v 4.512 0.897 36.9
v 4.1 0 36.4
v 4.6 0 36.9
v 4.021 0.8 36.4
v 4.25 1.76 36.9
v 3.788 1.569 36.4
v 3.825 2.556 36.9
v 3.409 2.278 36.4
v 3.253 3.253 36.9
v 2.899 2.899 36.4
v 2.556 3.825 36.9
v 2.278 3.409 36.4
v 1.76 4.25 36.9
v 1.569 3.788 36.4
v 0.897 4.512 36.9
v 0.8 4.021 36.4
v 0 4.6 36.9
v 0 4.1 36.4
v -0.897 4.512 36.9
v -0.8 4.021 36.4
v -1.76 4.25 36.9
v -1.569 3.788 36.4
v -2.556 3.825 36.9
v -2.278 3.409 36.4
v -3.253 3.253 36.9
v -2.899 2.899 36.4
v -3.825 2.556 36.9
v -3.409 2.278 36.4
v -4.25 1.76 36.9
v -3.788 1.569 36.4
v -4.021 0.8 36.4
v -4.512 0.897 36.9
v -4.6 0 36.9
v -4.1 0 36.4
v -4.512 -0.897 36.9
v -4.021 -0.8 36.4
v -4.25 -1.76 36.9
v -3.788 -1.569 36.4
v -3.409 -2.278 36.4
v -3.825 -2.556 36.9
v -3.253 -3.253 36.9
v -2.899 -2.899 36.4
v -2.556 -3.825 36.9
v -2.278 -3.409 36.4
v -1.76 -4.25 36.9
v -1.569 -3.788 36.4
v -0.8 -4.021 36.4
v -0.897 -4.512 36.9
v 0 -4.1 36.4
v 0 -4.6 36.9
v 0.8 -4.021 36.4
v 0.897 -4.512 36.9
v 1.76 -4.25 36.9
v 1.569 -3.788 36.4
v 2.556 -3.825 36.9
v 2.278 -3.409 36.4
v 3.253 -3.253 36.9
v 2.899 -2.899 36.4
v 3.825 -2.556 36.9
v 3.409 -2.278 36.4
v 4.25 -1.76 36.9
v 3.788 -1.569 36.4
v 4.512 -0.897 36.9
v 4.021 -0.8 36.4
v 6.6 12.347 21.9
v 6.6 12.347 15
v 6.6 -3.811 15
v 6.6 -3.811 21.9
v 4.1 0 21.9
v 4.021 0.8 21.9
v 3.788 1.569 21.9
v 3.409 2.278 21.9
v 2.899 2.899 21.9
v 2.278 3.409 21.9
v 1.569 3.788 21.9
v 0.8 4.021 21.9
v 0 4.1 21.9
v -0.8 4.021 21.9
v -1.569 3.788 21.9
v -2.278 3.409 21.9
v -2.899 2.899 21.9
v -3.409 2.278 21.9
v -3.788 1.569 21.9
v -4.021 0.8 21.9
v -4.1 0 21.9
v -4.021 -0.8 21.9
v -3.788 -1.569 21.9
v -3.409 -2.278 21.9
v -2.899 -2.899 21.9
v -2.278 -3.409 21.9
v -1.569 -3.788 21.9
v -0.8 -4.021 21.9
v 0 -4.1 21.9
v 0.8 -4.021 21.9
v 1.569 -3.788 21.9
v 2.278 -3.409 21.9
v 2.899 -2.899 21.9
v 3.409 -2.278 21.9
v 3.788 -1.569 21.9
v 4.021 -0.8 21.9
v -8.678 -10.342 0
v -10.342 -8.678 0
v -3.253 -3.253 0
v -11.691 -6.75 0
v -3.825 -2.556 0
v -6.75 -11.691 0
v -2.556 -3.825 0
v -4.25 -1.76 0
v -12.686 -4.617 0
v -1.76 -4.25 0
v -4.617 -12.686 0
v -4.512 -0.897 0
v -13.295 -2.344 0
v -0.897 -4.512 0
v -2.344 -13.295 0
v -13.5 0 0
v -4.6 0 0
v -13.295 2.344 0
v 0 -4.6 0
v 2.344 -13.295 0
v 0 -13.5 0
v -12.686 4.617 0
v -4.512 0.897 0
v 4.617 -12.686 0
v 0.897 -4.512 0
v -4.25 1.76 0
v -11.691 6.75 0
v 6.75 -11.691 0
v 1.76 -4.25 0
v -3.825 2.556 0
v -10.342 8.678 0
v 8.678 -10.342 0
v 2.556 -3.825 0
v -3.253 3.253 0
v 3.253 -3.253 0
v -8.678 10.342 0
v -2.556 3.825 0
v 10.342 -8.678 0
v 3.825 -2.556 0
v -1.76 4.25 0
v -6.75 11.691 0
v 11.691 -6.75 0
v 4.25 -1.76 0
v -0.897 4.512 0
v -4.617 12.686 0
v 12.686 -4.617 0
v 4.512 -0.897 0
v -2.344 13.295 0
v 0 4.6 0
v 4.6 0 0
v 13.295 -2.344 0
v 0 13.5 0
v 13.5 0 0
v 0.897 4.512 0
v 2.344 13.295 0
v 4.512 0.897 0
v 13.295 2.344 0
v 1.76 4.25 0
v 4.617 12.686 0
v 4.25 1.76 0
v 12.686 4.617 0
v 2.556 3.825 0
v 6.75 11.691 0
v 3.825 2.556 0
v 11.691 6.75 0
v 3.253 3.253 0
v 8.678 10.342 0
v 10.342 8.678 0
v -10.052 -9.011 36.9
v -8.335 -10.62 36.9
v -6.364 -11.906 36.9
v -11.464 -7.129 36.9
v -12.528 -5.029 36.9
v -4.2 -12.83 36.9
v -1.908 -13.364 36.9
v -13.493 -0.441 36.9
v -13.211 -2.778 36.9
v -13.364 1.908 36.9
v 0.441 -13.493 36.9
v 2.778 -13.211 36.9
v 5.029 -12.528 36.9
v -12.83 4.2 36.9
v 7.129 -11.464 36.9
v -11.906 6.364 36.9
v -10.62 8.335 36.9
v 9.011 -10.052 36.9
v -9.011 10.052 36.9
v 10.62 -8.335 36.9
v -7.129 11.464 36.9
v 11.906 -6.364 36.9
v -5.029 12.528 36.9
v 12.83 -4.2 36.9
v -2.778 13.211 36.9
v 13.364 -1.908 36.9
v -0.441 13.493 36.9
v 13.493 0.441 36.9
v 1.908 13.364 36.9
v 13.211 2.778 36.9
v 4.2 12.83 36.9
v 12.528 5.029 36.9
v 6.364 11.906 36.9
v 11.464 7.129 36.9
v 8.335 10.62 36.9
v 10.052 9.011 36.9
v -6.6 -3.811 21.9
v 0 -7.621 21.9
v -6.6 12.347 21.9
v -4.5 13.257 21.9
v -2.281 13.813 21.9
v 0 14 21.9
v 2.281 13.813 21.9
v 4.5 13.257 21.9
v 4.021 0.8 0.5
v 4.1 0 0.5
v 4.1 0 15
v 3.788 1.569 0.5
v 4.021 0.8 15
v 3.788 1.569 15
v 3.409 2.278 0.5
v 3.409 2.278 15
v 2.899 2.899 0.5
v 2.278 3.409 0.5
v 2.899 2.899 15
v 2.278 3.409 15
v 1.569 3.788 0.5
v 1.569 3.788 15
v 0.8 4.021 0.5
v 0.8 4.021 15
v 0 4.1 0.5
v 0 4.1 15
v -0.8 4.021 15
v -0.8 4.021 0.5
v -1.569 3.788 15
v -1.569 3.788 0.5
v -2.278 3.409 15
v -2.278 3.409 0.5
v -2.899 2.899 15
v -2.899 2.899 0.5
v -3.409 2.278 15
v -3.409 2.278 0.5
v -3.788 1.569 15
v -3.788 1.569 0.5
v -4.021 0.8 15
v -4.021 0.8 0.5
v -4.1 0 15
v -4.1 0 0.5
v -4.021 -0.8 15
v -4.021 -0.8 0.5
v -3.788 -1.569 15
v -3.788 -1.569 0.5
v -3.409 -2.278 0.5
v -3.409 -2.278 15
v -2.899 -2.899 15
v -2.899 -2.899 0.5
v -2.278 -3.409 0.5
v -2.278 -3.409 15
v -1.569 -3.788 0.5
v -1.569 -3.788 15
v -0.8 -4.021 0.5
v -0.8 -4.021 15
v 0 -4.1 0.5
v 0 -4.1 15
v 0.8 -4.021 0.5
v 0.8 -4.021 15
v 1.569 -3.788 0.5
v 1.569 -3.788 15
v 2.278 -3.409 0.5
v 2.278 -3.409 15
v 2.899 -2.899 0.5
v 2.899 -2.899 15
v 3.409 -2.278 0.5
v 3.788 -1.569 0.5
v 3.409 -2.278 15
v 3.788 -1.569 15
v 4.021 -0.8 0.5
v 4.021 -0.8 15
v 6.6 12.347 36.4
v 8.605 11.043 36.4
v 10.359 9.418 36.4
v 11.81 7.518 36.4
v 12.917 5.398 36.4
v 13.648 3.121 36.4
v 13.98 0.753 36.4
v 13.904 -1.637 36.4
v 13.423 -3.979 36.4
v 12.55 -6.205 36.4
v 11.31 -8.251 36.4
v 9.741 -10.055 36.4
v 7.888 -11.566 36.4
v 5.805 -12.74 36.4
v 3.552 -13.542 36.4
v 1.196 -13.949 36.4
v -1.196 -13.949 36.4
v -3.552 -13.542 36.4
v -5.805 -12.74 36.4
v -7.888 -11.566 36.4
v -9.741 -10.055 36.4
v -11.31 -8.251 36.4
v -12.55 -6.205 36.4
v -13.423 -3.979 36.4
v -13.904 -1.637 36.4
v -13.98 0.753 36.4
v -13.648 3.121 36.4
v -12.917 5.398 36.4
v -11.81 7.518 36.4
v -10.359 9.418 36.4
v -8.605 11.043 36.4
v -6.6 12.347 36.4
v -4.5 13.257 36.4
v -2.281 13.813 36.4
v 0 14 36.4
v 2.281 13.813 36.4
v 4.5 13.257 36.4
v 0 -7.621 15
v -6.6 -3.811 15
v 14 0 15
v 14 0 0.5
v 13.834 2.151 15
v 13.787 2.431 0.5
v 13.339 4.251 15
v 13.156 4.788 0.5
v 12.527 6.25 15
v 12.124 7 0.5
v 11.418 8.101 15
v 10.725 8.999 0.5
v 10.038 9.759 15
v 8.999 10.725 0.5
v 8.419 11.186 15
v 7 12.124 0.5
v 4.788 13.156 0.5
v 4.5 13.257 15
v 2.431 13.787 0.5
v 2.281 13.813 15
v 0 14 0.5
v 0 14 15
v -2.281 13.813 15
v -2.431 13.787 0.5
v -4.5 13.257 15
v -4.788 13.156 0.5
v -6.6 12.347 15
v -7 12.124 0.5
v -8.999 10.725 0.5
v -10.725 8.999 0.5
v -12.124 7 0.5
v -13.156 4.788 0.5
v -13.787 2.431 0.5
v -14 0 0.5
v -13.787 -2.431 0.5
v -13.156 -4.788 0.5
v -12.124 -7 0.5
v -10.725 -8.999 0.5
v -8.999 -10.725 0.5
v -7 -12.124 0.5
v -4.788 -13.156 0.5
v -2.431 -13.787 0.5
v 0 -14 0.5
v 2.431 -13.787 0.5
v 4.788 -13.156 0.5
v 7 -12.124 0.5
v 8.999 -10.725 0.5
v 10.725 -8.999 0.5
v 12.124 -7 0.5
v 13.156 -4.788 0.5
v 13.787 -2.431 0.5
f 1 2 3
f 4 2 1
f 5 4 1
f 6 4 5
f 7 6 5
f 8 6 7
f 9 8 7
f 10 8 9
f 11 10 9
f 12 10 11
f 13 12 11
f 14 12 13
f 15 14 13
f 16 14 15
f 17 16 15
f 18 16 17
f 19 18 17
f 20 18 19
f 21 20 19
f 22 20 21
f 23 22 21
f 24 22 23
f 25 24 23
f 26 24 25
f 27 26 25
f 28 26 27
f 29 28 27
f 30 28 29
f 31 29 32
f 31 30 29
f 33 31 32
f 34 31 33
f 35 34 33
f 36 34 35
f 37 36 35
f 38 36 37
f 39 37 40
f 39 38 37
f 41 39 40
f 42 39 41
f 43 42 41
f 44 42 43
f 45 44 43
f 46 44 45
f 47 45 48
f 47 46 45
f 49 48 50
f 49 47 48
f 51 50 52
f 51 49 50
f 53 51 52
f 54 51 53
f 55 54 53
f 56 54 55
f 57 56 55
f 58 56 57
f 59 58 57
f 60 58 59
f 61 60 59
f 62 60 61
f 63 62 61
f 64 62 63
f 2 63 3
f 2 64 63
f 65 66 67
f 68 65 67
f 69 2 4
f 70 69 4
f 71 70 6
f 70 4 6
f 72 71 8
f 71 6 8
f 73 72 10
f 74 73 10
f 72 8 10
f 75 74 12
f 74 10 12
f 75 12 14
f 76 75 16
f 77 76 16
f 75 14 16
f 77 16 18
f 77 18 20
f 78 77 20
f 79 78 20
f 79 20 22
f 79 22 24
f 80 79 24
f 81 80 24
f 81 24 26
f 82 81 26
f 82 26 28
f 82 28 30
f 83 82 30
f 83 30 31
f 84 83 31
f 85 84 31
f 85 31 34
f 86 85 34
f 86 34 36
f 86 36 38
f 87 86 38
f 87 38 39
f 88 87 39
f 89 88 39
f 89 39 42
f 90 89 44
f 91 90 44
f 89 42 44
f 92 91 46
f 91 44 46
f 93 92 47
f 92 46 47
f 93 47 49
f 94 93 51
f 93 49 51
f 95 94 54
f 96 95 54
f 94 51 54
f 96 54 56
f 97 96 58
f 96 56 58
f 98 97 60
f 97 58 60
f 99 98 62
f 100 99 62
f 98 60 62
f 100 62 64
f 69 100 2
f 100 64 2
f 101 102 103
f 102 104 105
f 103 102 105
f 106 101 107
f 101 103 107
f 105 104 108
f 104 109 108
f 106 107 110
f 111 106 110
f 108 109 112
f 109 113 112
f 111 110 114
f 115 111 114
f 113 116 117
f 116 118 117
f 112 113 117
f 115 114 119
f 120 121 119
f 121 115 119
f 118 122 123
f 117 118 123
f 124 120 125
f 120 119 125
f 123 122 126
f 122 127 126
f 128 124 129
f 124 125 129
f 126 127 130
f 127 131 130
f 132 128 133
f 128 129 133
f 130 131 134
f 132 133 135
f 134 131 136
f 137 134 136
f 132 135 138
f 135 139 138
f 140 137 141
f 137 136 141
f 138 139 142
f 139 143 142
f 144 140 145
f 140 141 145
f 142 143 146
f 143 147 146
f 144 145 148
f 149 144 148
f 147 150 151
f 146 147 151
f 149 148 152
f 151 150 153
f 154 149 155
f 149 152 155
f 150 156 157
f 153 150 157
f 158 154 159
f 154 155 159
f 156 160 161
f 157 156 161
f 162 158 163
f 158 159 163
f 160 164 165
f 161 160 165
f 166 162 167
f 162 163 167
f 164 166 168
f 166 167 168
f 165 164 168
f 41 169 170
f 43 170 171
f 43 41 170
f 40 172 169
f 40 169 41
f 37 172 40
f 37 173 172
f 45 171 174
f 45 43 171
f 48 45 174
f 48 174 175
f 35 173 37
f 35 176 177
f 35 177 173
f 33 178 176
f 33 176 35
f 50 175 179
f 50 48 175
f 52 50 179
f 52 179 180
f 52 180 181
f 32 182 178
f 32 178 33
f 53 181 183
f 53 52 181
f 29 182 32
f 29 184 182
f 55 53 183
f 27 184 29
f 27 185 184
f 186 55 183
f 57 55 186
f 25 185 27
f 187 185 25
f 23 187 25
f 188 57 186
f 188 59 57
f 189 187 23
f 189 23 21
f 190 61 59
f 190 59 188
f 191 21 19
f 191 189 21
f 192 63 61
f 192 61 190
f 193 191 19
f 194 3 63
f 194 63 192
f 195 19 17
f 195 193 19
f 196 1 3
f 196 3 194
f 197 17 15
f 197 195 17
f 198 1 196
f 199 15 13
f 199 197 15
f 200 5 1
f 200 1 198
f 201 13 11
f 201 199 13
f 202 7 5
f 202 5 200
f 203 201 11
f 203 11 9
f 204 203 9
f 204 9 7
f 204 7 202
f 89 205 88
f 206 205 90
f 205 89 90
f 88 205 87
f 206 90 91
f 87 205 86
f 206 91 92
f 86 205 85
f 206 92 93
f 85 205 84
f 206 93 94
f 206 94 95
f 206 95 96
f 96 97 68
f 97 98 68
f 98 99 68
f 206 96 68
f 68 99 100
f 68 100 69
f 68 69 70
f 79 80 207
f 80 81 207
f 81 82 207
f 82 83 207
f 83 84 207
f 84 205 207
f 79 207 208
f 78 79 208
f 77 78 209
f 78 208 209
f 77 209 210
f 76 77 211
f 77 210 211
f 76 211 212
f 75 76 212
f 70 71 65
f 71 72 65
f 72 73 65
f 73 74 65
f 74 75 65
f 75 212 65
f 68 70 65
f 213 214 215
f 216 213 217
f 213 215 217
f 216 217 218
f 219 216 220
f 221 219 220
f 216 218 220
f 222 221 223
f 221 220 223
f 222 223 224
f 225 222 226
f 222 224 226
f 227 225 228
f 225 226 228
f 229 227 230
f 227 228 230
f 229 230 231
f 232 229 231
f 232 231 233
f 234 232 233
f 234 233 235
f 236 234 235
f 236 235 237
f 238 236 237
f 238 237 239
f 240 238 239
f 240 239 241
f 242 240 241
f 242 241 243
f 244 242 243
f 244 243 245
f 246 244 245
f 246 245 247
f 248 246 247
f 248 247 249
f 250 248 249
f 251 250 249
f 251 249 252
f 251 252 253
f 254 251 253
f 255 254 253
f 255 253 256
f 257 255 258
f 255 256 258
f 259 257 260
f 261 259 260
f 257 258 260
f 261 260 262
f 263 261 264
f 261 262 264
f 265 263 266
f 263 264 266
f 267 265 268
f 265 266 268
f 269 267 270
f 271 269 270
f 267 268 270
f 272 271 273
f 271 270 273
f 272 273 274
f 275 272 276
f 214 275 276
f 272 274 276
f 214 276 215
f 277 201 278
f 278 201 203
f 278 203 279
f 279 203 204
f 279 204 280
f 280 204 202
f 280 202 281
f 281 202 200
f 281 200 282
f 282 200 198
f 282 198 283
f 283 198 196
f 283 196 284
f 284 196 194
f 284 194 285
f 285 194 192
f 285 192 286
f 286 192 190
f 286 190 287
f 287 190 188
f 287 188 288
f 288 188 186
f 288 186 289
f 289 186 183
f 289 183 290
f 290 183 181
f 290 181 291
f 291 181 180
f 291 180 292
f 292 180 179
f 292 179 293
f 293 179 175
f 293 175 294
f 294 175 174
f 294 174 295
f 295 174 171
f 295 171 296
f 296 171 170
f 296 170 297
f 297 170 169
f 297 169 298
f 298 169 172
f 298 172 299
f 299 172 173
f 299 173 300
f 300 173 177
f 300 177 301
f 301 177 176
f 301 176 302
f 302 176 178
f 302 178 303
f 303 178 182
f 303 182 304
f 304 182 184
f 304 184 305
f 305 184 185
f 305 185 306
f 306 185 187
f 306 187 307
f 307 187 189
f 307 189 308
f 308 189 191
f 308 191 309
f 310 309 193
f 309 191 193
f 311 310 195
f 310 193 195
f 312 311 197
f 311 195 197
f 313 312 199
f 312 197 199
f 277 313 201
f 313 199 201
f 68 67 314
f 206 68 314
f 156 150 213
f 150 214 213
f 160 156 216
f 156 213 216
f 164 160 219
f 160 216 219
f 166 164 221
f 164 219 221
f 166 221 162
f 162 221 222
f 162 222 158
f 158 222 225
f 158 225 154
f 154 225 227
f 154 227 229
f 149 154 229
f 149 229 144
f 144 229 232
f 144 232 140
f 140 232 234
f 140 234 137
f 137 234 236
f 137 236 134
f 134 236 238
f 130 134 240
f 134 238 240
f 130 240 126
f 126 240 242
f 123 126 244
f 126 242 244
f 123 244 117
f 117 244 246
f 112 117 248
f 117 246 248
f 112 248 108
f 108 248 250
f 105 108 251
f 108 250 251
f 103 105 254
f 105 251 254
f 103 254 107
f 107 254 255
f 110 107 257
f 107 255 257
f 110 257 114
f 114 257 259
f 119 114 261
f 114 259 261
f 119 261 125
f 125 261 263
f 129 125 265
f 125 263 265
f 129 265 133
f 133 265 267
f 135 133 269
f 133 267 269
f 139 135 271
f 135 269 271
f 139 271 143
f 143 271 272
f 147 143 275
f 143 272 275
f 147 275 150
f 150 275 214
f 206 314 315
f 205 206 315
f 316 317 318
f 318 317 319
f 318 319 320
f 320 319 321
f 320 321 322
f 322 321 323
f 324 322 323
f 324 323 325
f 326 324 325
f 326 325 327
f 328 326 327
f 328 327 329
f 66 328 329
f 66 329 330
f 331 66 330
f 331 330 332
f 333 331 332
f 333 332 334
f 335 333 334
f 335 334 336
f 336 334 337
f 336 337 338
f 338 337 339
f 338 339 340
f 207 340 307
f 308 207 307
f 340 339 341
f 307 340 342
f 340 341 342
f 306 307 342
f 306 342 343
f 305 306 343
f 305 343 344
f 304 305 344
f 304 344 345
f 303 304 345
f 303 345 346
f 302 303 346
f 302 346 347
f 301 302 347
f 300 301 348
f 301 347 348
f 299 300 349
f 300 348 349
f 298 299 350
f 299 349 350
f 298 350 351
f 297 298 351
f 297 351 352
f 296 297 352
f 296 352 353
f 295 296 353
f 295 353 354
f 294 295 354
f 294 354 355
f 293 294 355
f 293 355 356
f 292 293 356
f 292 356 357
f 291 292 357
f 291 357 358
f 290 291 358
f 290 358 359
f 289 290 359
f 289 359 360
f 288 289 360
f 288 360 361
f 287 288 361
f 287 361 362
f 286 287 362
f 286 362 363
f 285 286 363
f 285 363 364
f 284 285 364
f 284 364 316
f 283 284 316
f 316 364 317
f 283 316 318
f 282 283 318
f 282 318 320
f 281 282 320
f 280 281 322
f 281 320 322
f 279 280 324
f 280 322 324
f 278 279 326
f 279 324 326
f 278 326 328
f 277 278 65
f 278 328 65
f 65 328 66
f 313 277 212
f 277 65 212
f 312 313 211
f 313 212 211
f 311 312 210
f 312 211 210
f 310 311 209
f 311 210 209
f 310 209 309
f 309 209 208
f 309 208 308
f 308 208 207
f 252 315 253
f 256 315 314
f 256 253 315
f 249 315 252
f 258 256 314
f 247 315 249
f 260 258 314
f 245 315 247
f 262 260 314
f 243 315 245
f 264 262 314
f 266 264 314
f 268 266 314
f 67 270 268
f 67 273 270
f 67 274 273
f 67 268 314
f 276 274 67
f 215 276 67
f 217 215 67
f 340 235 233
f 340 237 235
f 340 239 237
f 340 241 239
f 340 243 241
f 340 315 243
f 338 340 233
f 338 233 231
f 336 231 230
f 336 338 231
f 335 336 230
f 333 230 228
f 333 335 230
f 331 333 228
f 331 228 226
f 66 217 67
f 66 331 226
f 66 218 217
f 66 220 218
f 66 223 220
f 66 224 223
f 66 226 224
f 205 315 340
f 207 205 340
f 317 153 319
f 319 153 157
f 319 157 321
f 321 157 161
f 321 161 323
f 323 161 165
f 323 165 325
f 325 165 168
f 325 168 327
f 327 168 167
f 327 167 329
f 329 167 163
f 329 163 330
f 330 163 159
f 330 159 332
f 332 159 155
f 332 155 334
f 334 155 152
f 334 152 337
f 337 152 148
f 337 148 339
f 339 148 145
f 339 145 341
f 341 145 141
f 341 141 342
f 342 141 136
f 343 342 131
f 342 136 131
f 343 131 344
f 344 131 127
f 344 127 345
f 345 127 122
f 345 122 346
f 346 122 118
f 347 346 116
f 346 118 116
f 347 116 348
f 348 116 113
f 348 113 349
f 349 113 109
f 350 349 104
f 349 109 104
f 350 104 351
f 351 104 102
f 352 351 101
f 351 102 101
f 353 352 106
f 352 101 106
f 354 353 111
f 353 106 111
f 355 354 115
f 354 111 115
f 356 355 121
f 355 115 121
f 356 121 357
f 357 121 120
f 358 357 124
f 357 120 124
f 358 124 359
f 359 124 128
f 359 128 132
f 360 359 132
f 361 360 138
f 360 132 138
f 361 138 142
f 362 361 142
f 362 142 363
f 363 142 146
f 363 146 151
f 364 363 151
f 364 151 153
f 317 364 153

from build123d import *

# Parameters (mm, degrees)
SKETCH1_R           = 14
BOSS_EXTRUDE1_DEPTH = 15
BOSS_EXTRUDE2_DEPTH = 6.9
BOSS_EXTRUDE3_DEPTH = 15
SKETCH4_R           = 4.1
CUT_EXTRUDE1_DEPTH  = 42.876126850509955


with BuildPart() as part:
    # Sketch1 → Boss-Extrude1 (new body)
    with BuildSketch(Plane.XY):
        Circle(SKETCH1_R)
    extrude(amount=BOSS_EXTRUDE1_DEPTH)

    # Sketch2 → Boss-Extrude2 (add)
    with BuildSketch(Plane.XY.offset(15)):
        with BuildLine():
            Line((-6.600000000000001, 3.810511776651534), (-6.600000000000002, 12.34665946724052))
            ThreePointArc((-6.600000000000002, 12.34665946724052), (-2.57e-15, -14), (6.599999999999997, 12.34665946724052))
            Line((6.599999999999997, 12.34665946724052), (6.599999999999997, 3.695041722813614))
            Line((6.599999999999997, 3.695041722813614), (6.599999999999998, -3.810511776651528))
            Line((6.599999999999998, -3.810511776651528), (-1.31e-15, -7.62102355330306))
            Line((-1.31e-15, -7.62102355330306), (-6.600000000000001, -3.8105117766515293))
            Line((-6.600000000000001, -3.8105117766515293), (-6.600000000000001, 3.810511776651534))
        make_face()
    extrude(amount=BOSS_EXTRUDE2_DEPTH)

    # Sketch3 → Boss-Extrude3 (add)
    with BuildSketch(Plane.XY.offset(21.9)):
        with BuildLine():
            ThreePointArc((6.599999999999995, 12.346659467240523), (-2.25e-15, 13.999999999999998), (-6.600000000000002, 12.34665946724052))
            ThreePointArc((-6.600000000000002, 12.34665946724052), (-2.57e-15, -14), (6.599999999999995, 12.346659467240523))
        make_face()
    extrude(amount=BOSS_EXTRUDE3_DEPTH)

    # Sketch4 → Cut-Extrude1 (cut, through all)
    with BuildSketch(Plane.XY.offset(36.900000000000006)):
        Circle(SKETCH4_R)
    extrude(amount=-CUT_EXTRUDE1_DEPTH, mode=Mode.SUBTRACT)

    # Chamfer1
    # the kernel refuses this chamfer: 0.5 mm, written as the material it takes off along each edge
    with BuildSketch(Plane(origin=(0, 0, 0), x_dir=(1, 0, 0), z_dir=(0, -1, 0))) as chamfer1_piece_1:
        with BuildLine():
            Line((14.01414213562373, 0.5141421356237309), (13.48585786437627, -0.01414213562373095))
            Line((13.48585786437627, -0.01414213562373095), (13.48585786437627, -0.02414213562373095))
            ThreePointArc((13.48585786437627, -0.02414213562373095), (13.742928932188136, -0.01), (14, -0.01))
            Line((14, -0.01), (14.01, 0))
            ThreePointArc((14.01, 0), (14.01, 0.25707106781186545), (14.02414213562373, 0.5141421356237309))
            Line((14.02414213562373, 0.5141421356237309), (14.01414213562373, 0.5141421356237309))
        make_face()
    revolve(axis=Axis((0, 0, 0), (0, 0, 1)), mode=Mode.SUBTRACT)
    with BuildSketch(Plane(origin=(1.11e-15, 1.7e-16, 36.9), x_dir=(0.4714285714285716, 0.8819042476600372, 0), z_dir=(-0.8819042476600372, 0.4714285714285716, 0))) as chamfer1_piece_2:
        with BuildLine():
            Line((14.01414213562373, 0.5141421356237288), (13.48585786437627, -0.01414213562372879))
            Line((13.48585786437627, -0.01414213562372879), (13.48585786437627, -0.0241421356237268))
            ThreePointArc((13.48585786437627, -0.0241421356237268), (13.742928932188134, -0.00999999999999801), (14, -0.00999999999999801))
            Line((14, -0.00999999999999801), (14.01, 0))
            ThreePointArc((14.01, 0), (14.01, 0.2570710678118644), (14.02414213562373, 0.5141421356237288))
            Line((14.02414213562373, 0.5141421356237288), (14.01414213562373, 0.5141421356237288))
        make_face()
    revolve(axis=Axis((1.11e-15, 1.7e-16, 36.9), (0, 0, -1)), mode=Mode.SUBTRACT)
    with BuildSketch(Plane(origin=(0, 0, 0), x_dir=(1, 0, 0), z_dir=(0, -1, 0))) as chamfer1_piece_3:
        with BuildLine():
            Line((4.61414213562373, -0.01414213562373095), (4.085857864376269, 0.5141421356237309))
            Line((4.085857864376269, 0.5141421356237309), (4.075857864376269, 0.5141421356237309))
            ThreePointArc((4.075857864376269, 0.5141421356237309), (4.09, 0.2570710678118644), (4.09, 0))
            Line((4.09, 0), (4.1, -0.01))
            ThreePointArc((4.1, -0.01), (4.357071067811865, -0.01), (4.61414213562373, -0.02414213562373095))
            Line((4.61414213562373, -0.02414213562373095), (4.61414213562373, -0.01414213562373095))
        make_face()
    revolve(axis=Axis((0, 0, 0), (0, 0, 1)), mode=Mode.SUBTRACT)
    with BuildSketch(Plane(origin=(0, 0, 36.900000000000006), x_dir=(1, 0, 0), z_dir=(0, -1, 0))) as chamfer1_piece_4:
        with BuildLine():
            Line((4.614142135623731, 0.01414213562372169), (4.085857864376268, -0.5141421356237288))
            Line((4.085857864376268, -0.5141421356237288), (4.075857864376268, -0.5141421356237288))
            ThreePointArc((4.075857864376268, -0.5141421356237288), (4.09, -0.2570710678118644), (4.09, 0))
            Line((4.09, 0), (4.1, 0.00999999999999801))
            ThreePointArc((4.1, 0.00999999999999801), (4.357071067811866, 0.00999999999999091), (4.614142135623731, 0.0241421356237197))
            Line((4.614142135623731, 0.0241421356237197), (4.614142135623731, 0.01414213562372169))
        make_face()
    revolve(axis=Axis((0, 0, 36.900000000000006), (0, 0, 1)), mode=Mode.SUBTRACT)


solid = part.part
